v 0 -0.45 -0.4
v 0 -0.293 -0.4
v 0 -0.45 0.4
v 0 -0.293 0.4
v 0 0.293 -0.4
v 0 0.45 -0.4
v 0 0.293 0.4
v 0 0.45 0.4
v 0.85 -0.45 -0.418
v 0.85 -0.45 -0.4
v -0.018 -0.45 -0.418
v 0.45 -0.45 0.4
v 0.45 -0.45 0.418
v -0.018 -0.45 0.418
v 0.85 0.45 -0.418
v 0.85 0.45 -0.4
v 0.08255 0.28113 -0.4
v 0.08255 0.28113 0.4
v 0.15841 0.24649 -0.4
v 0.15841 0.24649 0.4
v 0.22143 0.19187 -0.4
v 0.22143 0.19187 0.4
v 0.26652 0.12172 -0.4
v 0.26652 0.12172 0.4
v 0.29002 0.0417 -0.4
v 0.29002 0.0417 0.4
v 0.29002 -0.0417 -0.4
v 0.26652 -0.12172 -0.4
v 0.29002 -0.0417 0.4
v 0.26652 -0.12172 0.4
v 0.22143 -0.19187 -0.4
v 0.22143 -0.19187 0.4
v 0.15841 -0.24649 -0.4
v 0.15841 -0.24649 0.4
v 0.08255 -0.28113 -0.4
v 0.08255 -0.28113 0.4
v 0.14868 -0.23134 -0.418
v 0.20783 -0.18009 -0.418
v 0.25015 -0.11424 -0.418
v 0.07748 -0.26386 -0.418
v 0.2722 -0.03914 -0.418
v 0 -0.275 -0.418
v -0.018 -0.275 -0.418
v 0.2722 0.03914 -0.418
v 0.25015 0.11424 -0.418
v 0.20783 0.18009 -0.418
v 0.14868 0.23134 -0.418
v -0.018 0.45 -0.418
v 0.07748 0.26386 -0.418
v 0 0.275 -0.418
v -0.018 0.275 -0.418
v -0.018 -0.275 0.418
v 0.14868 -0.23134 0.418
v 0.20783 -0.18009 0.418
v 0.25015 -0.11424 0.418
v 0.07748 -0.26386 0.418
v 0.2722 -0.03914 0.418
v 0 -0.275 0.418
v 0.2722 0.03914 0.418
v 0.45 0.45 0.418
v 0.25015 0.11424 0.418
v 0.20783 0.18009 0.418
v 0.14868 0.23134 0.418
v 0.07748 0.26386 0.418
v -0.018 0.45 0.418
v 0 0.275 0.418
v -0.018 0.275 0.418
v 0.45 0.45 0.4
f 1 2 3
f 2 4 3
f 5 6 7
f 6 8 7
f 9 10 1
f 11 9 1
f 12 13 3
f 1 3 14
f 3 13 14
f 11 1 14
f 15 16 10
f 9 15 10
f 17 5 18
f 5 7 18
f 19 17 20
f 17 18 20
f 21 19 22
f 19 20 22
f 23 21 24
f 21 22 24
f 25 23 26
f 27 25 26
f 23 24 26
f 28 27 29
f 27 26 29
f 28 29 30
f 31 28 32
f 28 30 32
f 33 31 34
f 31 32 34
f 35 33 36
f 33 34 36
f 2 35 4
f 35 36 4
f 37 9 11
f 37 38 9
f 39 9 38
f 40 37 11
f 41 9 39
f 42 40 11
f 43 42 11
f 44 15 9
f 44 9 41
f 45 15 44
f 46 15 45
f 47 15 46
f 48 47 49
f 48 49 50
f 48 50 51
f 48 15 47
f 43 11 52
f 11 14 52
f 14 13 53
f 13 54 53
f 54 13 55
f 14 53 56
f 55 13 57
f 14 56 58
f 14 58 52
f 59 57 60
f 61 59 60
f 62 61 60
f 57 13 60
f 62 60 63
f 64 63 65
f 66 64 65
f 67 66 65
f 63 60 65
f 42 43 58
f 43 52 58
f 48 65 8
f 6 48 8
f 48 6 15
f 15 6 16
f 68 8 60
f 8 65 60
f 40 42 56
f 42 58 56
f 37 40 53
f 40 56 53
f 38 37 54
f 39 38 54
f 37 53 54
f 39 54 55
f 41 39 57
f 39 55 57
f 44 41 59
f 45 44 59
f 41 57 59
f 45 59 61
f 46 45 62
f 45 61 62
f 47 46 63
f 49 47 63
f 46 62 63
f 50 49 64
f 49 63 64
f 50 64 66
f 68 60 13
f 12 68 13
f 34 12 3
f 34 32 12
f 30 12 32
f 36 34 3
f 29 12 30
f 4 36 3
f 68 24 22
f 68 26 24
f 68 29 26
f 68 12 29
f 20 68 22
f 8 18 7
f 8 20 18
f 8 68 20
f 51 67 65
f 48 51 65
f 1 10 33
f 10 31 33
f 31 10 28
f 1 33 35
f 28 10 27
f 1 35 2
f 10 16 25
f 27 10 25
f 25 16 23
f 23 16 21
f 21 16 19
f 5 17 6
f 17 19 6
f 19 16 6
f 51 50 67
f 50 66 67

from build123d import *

# Parameters (mm, degrees)
P_IDAT_VYSUNUT_M1_DEPTH = 0.4
P_IDAT_START            = 0.018
P_IDAT_VYSUNUT_M2_DEPTH = 0.018
P_IDAT_VYSUNUT_M3_DEPTH = 0.018


with BuildPart() as part:
    # Skica1 → Přidat vysunutím1 (new, symmetric)
    with BuildSketch(Plane.XY):
        with BuildLine():
            Line((0, 0.275), (-0.018, 0.275))
            Line((-0.018, 0.275), (-0.018, 0.45))
            Line((-0.018, 0.45), (0, 0.45))
            Line((0, 0.45), (0, 0.293))
            ThreePointArc((0, 0.293), (0.293, 0), (0, -0.293))
            Line((0, -0.293), (0, -0.45))
            Line((0, -0.45), (-0.018, -0.45))
            Line((-0.018, -0.45), (-0.018, -0.275))
            Line((-0.018, -0.275), (0, -0.275))
            ThreePointArc((0, -0.275), (0.275, 0), (0, 0.275))
        make_face()
    extrude(amount=P_IDAT_VYSUNUT_M1_DEPTH, both=True)

    # Skica2 → Přidat vysunutím2 (add)
    with BuildSketch(Plane.XY.offset(0.4).offset(P_IDAT_START)):
        with BuildLine():
            Line((0, 0.45), (0.45, 0.45))
            Line((0.45, 0.45), (0.45, -0.45))
            Line((0.45, -0.45), (0, -0.45))
            Line((0, -0.45), (-0.018, -0.45))
            Line((-0.018, -0.45), (-0.018, -0.275))
            Line((-0.018, -0.275), (0, -0.275))
            ThreePointArc((0, -0.275), (0.275, 0), (0, 0.275))
            Line((0, 0.275), (-0.018, 0.275))
            Line((-0.018, 0.275), (-0.018, 0.45))
            Line((-0.018, 0.45), (0, 0.45))
        make_face()
    extrude(amount=-P_IDAT_VYSUNUT_M2_DEPTH)

    # Skica3 → Přidat vysunutím3 (add)
    with BuildSketch(Plane(origin=(0, 0, -0.4), x_dir=(-1, 0, 0), z_dir=(0, 0, -1))):
        with BuildLine():
            Line((0, 0.45), (-0.85, 0.45))
            Line((-0.85, 0.45), (-0.85, -0.45))
            Line((-0.85, -0.45), (0, -0.45))
            Line((0, -0.45), (0.018, -0.45))
            Line((0.018, -0.45), (0.018, -0.275))
            Line((0.018, -0.275), (0, -0.275))
            ThreePointArc((0, -0.275), (-0.275, 0), (0, 0.275))
            Line((0, 0.275), (0.018, 0.275))
            Line((0.018, 0.275), (0.018, 0.45))
            Line((0.018, 0.45), (0, 0.45))
        make_face()
    extrude(amount=P_IDAT_VYSUNUT_M3_DEPTH)


solid = part.part
